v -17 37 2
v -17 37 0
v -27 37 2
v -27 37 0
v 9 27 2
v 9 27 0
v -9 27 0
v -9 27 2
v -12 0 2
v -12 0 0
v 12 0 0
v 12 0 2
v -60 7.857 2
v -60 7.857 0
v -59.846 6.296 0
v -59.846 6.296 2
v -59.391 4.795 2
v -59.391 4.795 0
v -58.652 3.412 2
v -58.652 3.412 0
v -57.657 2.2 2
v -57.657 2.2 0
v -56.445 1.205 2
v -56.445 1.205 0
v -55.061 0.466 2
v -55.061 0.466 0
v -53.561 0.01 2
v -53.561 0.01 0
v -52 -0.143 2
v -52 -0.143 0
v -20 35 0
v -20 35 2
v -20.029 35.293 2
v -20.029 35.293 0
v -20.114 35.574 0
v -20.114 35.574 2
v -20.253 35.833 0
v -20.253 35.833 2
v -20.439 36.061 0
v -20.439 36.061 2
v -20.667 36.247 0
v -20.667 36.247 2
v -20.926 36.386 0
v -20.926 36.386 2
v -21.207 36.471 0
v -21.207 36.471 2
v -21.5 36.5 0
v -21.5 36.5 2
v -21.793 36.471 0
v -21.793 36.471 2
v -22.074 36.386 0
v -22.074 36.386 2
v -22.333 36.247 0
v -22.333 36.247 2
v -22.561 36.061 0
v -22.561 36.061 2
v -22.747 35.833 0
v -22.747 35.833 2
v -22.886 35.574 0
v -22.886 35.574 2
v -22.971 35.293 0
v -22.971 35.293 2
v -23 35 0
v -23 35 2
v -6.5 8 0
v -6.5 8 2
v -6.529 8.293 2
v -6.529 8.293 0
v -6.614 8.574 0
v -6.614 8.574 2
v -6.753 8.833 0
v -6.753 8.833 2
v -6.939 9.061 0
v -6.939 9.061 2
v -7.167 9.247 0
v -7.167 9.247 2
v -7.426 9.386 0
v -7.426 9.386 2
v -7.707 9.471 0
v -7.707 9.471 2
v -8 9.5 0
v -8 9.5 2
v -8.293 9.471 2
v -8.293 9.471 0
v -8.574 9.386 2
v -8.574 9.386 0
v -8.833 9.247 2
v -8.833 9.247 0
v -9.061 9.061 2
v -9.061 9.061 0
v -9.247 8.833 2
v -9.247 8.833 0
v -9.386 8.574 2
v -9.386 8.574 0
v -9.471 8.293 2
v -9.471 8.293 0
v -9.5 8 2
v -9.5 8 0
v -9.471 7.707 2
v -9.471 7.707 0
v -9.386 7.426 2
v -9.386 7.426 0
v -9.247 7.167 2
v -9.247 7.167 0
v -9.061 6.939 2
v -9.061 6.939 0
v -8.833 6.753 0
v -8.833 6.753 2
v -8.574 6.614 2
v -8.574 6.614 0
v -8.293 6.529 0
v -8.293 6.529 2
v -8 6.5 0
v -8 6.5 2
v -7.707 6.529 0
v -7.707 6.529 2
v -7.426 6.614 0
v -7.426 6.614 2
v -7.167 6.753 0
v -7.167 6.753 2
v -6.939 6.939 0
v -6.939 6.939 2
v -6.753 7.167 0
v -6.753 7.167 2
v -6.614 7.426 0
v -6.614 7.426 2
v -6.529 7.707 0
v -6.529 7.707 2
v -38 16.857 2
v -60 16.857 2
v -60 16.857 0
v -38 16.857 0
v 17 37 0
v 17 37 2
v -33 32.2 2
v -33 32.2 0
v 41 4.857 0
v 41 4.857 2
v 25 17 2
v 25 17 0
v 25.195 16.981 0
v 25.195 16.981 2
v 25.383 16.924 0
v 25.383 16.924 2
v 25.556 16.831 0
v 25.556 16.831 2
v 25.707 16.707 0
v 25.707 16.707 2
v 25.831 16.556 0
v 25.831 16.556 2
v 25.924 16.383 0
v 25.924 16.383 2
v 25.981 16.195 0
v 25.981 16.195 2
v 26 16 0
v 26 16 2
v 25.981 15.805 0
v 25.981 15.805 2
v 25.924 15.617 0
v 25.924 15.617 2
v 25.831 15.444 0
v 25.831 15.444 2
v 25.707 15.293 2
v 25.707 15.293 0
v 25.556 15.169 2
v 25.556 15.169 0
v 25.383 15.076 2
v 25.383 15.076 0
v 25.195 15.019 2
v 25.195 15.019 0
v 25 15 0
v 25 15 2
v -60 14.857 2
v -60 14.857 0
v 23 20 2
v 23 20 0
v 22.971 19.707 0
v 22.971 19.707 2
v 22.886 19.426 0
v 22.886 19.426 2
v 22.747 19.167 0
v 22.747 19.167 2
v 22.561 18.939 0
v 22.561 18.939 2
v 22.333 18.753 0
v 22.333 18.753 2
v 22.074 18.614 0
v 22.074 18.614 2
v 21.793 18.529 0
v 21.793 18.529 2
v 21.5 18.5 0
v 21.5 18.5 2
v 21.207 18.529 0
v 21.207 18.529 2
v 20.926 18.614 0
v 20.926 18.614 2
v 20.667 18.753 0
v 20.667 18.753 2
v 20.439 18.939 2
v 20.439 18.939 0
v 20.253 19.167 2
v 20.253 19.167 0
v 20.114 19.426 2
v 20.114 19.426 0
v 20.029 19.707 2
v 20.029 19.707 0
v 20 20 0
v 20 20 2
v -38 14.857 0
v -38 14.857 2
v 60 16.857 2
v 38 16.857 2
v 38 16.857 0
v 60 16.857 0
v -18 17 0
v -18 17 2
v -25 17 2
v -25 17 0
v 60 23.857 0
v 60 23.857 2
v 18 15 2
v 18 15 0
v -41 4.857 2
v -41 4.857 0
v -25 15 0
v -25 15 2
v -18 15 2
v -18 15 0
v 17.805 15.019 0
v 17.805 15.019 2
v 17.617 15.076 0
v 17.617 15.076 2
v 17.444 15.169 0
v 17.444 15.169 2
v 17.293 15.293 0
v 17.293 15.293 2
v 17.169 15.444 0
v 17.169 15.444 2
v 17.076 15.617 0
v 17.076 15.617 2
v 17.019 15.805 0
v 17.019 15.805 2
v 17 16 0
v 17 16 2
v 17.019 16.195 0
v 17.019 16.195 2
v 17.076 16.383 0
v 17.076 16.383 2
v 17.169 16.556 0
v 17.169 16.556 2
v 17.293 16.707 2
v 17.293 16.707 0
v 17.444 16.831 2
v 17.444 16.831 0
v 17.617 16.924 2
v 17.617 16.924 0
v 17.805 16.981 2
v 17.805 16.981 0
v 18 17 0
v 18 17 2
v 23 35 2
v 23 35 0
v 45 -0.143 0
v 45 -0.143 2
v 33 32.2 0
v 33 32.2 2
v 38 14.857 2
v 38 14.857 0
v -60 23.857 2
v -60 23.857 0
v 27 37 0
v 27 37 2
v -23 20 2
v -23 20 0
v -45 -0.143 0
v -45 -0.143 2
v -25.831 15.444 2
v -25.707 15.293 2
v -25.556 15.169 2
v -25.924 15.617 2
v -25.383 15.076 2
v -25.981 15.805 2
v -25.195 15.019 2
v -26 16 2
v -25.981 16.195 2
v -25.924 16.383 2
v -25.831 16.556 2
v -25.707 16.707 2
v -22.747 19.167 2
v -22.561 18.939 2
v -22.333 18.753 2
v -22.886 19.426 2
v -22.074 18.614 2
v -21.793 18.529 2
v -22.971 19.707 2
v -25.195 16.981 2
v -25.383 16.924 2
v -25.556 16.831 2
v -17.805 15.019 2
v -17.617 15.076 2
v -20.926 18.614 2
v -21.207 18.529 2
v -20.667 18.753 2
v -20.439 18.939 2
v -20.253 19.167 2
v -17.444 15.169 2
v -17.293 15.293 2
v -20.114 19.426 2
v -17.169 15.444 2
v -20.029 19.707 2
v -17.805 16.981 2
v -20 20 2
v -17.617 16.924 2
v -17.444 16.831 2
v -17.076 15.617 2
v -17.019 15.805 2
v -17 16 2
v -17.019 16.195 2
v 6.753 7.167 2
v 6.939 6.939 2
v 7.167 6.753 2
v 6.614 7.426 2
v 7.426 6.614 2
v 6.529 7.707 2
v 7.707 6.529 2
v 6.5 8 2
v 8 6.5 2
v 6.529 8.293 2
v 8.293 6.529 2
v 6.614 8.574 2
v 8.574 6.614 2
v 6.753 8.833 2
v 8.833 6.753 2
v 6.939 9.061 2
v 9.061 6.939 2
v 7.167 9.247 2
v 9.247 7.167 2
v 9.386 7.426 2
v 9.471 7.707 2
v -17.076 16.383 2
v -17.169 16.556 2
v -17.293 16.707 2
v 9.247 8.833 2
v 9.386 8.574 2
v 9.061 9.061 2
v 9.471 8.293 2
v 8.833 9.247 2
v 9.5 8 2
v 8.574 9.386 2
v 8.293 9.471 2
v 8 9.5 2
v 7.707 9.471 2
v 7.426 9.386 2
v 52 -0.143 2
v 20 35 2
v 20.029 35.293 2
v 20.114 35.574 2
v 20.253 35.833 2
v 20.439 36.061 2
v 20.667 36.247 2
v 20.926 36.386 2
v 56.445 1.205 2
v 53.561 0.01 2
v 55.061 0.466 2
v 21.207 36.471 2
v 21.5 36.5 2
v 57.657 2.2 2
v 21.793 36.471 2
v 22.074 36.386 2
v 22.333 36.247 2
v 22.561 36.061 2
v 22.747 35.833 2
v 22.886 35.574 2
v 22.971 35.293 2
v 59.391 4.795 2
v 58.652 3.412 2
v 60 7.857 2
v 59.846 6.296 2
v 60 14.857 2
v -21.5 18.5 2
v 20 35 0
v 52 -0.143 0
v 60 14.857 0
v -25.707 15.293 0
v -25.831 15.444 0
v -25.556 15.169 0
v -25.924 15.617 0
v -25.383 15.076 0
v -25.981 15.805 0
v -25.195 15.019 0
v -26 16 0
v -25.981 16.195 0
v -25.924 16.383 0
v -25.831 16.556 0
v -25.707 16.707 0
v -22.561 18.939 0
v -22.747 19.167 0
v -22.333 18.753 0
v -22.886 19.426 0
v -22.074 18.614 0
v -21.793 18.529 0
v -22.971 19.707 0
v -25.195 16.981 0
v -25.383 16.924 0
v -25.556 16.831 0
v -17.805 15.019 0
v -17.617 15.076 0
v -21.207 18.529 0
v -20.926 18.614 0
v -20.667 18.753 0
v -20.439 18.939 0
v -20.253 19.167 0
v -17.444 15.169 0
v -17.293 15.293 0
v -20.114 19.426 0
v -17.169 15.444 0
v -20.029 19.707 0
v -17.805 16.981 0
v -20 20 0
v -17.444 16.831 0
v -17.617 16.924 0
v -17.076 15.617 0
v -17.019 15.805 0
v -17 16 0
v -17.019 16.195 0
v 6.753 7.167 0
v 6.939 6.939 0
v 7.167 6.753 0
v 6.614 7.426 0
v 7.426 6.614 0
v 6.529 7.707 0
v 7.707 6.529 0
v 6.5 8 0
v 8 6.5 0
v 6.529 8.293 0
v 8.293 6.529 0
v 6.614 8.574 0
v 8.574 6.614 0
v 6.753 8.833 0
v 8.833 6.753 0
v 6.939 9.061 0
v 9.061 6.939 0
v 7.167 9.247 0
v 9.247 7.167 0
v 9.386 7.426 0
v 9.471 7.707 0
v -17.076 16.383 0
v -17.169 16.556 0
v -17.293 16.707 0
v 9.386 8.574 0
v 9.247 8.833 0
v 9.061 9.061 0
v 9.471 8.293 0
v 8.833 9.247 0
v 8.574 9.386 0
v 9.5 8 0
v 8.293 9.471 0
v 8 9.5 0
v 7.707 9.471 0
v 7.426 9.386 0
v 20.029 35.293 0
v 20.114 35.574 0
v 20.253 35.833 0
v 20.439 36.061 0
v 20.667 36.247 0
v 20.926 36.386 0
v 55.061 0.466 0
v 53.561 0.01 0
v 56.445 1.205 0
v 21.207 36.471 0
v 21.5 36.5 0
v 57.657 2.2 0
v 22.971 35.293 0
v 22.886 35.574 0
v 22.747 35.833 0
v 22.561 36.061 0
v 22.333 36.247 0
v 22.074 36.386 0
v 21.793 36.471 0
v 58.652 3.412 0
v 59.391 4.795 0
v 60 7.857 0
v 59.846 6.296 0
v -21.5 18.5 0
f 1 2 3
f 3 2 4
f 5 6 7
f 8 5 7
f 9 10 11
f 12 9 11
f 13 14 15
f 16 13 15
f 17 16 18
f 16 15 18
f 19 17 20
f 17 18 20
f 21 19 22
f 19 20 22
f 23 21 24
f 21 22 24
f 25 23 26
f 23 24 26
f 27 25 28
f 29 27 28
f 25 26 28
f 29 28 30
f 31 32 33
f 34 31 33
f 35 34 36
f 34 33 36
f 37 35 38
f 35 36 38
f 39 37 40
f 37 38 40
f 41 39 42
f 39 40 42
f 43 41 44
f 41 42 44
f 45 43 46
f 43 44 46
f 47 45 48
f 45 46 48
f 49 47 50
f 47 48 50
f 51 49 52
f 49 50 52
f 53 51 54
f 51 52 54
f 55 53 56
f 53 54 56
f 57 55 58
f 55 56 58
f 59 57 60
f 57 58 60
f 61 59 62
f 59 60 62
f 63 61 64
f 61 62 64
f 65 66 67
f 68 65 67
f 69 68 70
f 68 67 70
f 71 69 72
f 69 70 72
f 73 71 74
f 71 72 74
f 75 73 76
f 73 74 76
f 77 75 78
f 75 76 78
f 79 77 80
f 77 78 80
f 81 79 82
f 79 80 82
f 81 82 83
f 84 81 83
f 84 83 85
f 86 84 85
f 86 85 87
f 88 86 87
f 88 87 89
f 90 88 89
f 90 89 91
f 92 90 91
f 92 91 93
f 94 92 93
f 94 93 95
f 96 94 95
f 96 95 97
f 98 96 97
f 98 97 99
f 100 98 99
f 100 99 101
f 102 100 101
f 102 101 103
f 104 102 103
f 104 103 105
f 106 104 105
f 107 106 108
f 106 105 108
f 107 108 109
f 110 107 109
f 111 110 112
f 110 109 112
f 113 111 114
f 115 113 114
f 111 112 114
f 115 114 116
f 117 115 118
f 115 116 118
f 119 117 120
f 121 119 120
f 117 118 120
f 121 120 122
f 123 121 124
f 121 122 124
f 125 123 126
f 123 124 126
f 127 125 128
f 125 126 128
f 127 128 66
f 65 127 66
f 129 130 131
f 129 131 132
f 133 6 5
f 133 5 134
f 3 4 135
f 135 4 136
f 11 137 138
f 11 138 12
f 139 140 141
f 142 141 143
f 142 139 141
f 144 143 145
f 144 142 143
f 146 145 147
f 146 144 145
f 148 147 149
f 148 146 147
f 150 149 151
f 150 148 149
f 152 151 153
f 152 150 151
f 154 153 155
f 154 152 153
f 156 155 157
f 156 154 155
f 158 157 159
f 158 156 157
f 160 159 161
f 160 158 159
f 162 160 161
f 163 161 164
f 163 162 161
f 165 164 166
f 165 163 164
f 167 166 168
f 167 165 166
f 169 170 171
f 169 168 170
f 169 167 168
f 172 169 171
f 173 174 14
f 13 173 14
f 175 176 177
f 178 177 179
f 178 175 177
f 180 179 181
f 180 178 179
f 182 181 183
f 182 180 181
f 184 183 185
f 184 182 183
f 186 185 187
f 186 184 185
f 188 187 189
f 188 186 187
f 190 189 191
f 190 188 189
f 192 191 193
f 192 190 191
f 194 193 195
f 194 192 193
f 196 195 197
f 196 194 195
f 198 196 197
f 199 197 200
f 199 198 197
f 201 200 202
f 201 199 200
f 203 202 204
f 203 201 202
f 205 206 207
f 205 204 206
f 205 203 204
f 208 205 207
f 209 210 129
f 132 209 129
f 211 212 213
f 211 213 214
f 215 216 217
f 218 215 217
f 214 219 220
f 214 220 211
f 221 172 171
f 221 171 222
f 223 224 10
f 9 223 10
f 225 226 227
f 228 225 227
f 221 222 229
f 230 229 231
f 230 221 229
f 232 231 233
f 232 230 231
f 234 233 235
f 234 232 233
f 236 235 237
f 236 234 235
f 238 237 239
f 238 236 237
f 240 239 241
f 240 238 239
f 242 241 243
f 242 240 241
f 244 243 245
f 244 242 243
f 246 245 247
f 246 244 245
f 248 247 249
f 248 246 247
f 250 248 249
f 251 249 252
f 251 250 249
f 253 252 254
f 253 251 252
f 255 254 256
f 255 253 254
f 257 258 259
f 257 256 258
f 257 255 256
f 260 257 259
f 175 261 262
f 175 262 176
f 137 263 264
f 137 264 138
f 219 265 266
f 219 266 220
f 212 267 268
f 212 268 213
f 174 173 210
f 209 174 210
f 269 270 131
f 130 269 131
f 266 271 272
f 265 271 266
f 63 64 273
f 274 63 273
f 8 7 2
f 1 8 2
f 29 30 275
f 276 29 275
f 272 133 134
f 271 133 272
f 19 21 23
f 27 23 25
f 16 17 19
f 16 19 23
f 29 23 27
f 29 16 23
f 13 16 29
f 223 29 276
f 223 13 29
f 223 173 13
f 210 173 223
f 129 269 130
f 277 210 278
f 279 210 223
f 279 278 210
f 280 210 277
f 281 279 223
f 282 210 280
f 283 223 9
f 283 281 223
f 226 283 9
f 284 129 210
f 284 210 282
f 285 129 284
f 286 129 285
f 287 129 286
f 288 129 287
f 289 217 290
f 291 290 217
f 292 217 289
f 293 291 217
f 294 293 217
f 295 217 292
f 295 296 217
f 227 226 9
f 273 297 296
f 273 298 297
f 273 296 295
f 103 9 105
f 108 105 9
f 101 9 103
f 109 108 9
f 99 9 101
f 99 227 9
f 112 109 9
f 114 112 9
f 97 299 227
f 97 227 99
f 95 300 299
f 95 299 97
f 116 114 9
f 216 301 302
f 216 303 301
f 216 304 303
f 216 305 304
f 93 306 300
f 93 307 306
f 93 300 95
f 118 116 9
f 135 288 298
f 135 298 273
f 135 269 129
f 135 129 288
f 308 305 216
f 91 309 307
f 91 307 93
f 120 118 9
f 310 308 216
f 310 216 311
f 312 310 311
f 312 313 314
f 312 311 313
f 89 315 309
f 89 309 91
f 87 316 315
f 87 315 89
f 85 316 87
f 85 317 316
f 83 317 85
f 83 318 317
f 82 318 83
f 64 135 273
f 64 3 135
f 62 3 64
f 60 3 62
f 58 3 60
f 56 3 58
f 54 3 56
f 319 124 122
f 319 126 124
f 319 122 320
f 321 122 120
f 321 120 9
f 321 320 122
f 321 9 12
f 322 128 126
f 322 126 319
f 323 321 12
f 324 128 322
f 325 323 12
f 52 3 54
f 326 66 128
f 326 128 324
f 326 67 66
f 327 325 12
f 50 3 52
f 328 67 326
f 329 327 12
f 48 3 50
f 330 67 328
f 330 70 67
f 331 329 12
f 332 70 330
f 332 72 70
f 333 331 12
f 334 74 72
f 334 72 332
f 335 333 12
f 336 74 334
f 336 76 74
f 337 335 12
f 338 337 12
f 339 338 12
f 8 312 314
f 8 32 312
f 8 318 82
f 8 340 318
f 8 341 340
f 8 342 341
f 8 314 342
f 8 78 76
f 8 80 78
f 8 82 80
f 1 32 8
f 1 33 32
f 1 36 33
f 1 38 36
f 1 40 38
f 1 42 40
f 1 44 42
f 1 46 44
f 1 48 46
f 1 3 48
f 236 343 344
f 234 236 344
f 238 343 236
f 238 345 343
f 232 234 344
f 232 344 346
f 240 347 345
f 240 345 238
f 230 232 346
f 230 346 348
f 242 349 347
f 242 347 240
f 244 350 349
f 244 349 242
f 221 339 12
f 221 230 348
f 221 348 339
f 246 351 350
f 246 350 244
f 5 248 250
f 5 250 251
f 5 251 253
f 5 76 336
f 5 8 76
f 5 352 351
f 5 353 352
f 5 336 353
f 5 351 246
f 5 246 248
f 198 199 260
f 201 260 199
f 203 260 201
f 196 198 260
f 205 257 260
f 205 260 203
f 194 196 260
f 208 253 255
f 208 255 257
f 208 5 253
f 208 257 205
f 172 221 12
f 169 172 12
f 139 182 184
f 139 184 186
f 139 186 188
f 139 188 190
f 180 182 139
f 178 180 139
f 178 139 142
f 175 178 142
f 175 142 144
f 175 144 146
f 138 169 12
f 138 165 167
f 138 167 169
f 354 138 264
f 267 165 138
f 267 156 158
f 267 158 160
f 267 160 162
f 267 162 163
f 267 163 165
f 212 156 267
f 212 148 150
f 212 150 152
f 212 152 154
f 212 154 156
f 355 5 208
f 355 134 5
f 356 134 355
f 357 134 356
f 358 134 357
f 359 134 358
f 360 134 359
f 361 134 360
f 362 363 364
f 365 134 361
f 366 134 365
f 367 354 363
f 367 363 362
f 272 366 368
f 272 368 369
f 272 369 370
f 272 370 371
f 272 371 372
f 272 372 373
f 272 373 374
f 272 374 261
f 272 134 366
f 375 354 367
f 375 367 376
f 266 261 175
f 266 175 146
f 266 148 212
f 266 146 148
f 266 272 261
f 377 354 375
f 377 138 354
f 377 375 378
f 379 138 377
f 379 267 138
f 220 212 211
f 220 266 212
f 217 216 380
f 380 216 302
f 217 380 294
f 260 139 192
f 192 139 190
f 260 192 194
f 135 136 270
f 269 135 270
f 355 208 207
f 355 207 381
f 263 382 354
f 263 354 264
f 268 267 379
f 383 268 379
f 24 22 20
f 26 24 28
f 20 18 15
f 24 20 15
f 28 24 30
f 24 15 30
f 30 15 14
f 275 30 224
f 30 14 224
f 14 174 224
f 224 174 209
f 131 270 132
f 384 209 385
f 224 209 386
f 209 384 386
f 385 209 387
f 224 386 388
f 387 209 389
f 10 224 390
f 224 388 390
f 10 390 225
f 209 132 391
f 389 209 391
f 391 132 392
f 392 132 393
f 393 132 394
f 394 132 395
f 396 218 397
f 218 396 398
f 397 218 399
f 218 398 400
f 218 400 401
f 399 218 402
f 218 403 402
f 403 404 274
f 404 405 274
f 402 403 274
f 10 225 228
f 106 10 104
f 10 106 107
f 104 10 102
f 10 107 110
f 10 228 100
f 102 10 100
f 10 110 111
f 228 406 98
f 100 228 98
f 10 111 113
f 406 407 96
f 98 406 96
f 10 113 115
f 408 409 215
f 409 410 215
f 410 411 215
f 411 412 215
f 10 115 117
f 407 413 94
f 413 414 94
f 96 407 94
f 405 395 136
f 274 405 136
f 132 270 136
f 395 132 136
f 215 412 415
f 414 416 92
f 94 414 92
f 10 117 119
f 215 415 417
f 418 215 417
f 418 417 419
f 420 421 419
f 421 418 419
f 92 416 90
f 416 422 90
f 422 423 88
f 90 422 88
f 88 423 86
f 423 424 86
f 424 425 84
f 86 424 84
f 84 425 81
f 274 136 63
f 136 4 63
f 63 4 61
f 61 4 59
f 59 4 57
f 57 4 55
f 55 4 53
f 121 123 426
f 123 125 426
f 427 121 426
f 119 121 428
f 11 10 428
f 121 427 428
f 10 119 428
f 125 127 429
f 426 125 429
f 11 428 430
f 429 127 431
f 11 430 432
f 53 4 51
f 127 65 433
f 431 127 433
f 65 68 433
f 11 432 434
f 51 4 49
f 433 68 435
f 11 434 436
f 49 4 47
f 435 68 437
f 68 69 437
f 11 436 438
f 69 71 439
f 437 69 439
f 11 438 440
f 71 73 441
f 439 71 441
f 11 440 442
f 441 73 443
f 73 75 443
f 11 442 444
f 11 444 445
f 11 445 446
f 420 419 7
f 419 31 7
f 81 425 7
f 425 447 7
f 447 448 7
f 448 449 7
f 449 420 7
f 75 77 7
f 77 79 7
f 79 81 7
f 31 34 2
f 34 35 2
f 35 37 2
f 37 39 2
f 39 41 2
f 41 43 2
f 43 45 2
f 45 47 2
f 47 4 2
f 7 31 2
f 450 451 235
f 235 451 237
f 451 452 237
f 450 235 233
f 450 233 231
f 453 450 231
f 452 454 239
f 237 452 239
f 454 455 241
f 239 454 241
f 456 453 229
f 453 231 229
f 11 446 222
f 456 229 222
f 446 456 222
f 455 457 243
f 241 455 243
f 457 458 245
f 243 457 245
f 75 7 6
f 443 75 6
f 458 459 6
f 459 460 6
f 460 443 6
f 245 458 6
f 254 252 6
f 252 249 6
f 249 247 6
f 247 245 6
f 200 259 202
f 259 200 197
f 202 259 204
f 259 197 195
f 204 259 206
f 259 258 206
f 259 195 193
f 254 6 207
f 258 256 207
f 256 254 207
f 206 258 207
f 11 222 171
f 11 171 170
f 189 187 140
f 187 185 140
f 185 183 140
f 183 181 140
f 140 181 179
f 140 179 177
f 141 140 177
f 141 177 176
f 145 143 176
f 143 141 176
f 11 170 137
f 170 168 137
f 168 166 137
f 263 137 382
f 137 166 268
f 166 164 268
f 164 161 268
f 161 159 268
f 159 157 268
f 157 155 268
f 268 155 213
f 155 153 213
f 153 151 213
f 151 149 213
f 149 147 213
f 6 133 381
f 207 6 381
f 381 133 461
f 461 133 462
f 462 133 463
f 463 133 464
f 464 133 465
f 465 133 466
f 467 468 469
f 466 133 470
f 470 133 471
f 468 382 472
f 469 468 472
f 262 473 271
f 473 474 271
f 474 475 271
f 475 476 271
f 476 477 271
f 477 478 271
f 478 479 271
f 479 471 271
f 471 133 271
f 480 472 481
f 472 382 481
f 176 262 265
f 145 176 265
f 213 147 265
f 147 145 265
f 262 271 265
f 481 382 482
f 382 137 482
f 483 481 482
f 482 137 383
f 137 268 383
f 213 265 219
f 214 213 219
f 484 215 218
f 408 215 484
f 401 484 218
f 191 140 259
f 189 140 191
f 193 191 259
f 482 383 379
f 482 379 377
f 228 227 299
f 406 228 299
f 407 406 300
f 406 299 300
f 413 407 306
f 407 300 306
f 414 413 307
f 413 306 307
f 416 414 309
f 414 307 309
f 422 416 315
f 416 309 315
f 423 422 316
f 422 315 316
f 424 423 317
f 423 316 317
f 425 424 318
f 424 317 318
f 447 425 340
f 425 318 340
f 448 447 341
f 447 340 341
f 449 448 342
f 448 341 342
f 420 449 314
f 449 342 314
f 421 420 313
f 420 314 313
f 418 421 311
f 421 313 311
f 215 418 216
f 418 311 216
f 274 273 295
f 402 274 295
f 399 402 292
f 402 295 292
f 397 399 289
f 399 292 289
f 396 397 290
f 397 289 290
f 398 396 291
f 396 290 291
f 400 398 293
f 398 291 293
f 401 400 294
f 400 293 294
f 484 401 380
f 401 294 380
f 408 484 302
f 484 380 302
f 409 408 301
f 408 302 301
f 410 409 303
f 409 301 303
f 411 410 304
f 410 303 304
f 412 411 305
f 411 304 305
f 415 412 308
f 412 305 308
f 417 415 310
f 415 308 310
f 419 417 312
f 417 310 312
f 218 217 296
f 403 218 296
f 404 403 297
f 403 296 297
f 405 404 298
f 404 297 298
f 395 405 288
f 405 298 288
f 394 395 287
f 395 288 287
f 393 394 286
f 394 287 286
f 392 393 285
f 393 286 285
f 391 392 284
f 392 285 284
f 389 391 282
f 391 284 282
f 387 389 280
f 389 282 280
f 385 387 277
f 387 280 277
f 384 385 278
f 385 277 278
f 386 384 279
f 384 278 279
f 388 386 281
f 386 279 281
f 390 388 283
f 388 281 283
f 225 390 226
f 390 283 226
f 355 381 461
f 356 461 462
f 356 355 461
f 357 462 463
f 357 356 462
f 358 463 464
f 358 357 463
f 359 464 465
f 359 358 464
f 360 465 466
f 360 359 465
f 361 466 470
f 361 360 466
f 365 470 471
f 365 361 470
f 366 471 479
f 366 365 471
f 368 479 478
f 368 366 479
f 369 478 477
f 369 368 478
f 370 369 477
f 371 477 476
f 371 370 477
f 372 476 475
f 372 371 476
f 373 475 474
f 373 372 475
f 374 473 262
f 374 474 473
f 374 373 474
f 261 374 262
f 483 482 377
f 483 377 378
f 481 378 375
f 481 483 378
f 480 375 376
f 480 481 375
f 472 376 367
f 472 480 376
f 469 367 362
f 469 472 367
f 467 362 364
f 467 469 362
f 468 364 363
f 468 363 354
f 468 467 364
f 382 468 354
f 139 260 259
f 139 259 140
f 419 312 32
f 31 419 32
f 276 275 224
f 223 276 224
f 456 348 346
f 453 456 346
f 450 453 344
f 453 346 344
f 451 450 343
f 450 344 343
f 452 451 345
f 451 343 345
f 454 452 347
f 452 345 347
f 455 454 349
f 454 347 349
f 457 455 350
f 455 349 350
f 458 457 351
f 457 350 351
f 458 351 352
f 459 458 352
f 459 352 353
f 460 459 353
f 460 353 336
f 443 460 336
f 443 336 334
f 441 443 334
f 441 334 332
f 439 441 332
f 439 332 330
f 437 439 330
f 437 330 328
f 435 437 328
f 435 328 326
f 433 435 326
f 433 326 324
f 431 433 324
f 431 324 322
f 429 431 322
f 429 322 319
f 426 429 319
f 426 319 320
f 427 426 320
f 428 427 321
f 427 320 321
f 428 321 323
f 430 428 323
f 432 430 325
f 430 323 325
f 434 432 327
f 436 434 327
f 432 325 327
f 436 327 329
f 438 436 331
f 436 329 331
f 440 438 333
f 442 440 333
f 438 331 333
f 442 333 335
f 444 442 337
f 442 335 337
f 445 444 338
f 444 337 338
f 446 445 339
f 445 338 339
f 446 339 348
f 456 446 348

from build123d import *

# Parameters (mm, degrees)
RESSALTO_EXTRUS_O1_DEPTH = 2
ESBO_O2_R                = 1.5
ESBO_O2_W                = 22
ESBO_O2_H                = 2
CORTE_EXTRUS_O1_DEPTH    = 3


with BuildPart() as part:
    # Esboço1 → Ressalto-extrusão1 (new body)
    with BuildSketch(Plane.XY):
        with BuildLine():
            Line((52, -0.143401487), (45, -0.143401487))
            Line((45, -0.143401487), (41, 4.856598513))
            Line((41, 4.856598513), (12, 0))
            Line((12, 0), (0, 0))
            Line((0, 0), (0, 27))
            Line((0, 27), (9, 27))
            Line((9, 27), (17, 37))
            Line((17, 37), (27, 37))
            Line((27, 37), (33, 32.2))
            Line((33, 32.2), (60, 23.856598513))
            Line((60, 23.856598513), (60, 7.856598513))
            ThreePointArc((60, 7.856598513), (57.656854249, 2.199744264), (52, -0.143401487))
        make_face()
    ressalto_extrus_o1 = extrude(amount=RESSALTO_EXTRUS_O1_DEPTH)

    # Espelhar1: Ressalto-extrusão1 across plane
    add(ressalto_extrus_o1.mirror(Plane(origin=(0, 0, 0), x_dir=(0, 0, 1), z_dir=(1, 0, 0))))

    # Esboço2 → Corte-extrusão1 (cut, through all)
    with BuildSketch(Plane.XY.offset(2)):
        with Locations((8, 8)):
            Circle(ESBO_O2_R)
        with Locations((-8, 8)):
            Circle(ESBO_O2_R)
        with Locations((49, 15.856598513)):
            Rectangle(ESBO_O2_W, ESBO_O2_H)
        with BuildLine():
            Line((23, 35), (23, 20))
            ThreePointArc((23, 20), (21.5, 18.5), (20, 20))
            Line((20, 20), (20, 35))
            ThreePointArc((20, 35), (21.5, 36.5), (23, 35))
        make_face()
        with BuildLine():
            Line((25, 15), (18, 15))
            ThreePointArc((18, 15), (17, 16), (18, 17))
            Line((18, 17), (25, 17))
            ThreePointArc((25, 17), (26, 16), (25, 15))
        make_face()
        with BuildLine():
            Line((-23, 35), (-23, 20))
            ThreePointArc((-23, 20), (-21.5, 18.5), (-20, 20))
            Line((-20, 20), (-20, 35))
            ThreePointArc((-20, 35), (-21.5, 36.5), (-23, 35))
        make_face()
        with BuildLine():
            Line((-25, 15), (-18, 15))
            ThreePointArc((-18, 15), (-17, 16), (-18, 17))
            Line((-18, 17), (-25, 17))
            ThreePointArc((-25, 17), (-26, 16), (-25, 15))
        make_face()
        with Locations((-49, 15.856598513)):
            Rectangle(ESBO_O2_W, ESBO_O2_H)
    extrude(amount=-CORTE_EXTRUS_O1_DEPTH, mode=Mode.SUBTRACT)


solid = part.part
